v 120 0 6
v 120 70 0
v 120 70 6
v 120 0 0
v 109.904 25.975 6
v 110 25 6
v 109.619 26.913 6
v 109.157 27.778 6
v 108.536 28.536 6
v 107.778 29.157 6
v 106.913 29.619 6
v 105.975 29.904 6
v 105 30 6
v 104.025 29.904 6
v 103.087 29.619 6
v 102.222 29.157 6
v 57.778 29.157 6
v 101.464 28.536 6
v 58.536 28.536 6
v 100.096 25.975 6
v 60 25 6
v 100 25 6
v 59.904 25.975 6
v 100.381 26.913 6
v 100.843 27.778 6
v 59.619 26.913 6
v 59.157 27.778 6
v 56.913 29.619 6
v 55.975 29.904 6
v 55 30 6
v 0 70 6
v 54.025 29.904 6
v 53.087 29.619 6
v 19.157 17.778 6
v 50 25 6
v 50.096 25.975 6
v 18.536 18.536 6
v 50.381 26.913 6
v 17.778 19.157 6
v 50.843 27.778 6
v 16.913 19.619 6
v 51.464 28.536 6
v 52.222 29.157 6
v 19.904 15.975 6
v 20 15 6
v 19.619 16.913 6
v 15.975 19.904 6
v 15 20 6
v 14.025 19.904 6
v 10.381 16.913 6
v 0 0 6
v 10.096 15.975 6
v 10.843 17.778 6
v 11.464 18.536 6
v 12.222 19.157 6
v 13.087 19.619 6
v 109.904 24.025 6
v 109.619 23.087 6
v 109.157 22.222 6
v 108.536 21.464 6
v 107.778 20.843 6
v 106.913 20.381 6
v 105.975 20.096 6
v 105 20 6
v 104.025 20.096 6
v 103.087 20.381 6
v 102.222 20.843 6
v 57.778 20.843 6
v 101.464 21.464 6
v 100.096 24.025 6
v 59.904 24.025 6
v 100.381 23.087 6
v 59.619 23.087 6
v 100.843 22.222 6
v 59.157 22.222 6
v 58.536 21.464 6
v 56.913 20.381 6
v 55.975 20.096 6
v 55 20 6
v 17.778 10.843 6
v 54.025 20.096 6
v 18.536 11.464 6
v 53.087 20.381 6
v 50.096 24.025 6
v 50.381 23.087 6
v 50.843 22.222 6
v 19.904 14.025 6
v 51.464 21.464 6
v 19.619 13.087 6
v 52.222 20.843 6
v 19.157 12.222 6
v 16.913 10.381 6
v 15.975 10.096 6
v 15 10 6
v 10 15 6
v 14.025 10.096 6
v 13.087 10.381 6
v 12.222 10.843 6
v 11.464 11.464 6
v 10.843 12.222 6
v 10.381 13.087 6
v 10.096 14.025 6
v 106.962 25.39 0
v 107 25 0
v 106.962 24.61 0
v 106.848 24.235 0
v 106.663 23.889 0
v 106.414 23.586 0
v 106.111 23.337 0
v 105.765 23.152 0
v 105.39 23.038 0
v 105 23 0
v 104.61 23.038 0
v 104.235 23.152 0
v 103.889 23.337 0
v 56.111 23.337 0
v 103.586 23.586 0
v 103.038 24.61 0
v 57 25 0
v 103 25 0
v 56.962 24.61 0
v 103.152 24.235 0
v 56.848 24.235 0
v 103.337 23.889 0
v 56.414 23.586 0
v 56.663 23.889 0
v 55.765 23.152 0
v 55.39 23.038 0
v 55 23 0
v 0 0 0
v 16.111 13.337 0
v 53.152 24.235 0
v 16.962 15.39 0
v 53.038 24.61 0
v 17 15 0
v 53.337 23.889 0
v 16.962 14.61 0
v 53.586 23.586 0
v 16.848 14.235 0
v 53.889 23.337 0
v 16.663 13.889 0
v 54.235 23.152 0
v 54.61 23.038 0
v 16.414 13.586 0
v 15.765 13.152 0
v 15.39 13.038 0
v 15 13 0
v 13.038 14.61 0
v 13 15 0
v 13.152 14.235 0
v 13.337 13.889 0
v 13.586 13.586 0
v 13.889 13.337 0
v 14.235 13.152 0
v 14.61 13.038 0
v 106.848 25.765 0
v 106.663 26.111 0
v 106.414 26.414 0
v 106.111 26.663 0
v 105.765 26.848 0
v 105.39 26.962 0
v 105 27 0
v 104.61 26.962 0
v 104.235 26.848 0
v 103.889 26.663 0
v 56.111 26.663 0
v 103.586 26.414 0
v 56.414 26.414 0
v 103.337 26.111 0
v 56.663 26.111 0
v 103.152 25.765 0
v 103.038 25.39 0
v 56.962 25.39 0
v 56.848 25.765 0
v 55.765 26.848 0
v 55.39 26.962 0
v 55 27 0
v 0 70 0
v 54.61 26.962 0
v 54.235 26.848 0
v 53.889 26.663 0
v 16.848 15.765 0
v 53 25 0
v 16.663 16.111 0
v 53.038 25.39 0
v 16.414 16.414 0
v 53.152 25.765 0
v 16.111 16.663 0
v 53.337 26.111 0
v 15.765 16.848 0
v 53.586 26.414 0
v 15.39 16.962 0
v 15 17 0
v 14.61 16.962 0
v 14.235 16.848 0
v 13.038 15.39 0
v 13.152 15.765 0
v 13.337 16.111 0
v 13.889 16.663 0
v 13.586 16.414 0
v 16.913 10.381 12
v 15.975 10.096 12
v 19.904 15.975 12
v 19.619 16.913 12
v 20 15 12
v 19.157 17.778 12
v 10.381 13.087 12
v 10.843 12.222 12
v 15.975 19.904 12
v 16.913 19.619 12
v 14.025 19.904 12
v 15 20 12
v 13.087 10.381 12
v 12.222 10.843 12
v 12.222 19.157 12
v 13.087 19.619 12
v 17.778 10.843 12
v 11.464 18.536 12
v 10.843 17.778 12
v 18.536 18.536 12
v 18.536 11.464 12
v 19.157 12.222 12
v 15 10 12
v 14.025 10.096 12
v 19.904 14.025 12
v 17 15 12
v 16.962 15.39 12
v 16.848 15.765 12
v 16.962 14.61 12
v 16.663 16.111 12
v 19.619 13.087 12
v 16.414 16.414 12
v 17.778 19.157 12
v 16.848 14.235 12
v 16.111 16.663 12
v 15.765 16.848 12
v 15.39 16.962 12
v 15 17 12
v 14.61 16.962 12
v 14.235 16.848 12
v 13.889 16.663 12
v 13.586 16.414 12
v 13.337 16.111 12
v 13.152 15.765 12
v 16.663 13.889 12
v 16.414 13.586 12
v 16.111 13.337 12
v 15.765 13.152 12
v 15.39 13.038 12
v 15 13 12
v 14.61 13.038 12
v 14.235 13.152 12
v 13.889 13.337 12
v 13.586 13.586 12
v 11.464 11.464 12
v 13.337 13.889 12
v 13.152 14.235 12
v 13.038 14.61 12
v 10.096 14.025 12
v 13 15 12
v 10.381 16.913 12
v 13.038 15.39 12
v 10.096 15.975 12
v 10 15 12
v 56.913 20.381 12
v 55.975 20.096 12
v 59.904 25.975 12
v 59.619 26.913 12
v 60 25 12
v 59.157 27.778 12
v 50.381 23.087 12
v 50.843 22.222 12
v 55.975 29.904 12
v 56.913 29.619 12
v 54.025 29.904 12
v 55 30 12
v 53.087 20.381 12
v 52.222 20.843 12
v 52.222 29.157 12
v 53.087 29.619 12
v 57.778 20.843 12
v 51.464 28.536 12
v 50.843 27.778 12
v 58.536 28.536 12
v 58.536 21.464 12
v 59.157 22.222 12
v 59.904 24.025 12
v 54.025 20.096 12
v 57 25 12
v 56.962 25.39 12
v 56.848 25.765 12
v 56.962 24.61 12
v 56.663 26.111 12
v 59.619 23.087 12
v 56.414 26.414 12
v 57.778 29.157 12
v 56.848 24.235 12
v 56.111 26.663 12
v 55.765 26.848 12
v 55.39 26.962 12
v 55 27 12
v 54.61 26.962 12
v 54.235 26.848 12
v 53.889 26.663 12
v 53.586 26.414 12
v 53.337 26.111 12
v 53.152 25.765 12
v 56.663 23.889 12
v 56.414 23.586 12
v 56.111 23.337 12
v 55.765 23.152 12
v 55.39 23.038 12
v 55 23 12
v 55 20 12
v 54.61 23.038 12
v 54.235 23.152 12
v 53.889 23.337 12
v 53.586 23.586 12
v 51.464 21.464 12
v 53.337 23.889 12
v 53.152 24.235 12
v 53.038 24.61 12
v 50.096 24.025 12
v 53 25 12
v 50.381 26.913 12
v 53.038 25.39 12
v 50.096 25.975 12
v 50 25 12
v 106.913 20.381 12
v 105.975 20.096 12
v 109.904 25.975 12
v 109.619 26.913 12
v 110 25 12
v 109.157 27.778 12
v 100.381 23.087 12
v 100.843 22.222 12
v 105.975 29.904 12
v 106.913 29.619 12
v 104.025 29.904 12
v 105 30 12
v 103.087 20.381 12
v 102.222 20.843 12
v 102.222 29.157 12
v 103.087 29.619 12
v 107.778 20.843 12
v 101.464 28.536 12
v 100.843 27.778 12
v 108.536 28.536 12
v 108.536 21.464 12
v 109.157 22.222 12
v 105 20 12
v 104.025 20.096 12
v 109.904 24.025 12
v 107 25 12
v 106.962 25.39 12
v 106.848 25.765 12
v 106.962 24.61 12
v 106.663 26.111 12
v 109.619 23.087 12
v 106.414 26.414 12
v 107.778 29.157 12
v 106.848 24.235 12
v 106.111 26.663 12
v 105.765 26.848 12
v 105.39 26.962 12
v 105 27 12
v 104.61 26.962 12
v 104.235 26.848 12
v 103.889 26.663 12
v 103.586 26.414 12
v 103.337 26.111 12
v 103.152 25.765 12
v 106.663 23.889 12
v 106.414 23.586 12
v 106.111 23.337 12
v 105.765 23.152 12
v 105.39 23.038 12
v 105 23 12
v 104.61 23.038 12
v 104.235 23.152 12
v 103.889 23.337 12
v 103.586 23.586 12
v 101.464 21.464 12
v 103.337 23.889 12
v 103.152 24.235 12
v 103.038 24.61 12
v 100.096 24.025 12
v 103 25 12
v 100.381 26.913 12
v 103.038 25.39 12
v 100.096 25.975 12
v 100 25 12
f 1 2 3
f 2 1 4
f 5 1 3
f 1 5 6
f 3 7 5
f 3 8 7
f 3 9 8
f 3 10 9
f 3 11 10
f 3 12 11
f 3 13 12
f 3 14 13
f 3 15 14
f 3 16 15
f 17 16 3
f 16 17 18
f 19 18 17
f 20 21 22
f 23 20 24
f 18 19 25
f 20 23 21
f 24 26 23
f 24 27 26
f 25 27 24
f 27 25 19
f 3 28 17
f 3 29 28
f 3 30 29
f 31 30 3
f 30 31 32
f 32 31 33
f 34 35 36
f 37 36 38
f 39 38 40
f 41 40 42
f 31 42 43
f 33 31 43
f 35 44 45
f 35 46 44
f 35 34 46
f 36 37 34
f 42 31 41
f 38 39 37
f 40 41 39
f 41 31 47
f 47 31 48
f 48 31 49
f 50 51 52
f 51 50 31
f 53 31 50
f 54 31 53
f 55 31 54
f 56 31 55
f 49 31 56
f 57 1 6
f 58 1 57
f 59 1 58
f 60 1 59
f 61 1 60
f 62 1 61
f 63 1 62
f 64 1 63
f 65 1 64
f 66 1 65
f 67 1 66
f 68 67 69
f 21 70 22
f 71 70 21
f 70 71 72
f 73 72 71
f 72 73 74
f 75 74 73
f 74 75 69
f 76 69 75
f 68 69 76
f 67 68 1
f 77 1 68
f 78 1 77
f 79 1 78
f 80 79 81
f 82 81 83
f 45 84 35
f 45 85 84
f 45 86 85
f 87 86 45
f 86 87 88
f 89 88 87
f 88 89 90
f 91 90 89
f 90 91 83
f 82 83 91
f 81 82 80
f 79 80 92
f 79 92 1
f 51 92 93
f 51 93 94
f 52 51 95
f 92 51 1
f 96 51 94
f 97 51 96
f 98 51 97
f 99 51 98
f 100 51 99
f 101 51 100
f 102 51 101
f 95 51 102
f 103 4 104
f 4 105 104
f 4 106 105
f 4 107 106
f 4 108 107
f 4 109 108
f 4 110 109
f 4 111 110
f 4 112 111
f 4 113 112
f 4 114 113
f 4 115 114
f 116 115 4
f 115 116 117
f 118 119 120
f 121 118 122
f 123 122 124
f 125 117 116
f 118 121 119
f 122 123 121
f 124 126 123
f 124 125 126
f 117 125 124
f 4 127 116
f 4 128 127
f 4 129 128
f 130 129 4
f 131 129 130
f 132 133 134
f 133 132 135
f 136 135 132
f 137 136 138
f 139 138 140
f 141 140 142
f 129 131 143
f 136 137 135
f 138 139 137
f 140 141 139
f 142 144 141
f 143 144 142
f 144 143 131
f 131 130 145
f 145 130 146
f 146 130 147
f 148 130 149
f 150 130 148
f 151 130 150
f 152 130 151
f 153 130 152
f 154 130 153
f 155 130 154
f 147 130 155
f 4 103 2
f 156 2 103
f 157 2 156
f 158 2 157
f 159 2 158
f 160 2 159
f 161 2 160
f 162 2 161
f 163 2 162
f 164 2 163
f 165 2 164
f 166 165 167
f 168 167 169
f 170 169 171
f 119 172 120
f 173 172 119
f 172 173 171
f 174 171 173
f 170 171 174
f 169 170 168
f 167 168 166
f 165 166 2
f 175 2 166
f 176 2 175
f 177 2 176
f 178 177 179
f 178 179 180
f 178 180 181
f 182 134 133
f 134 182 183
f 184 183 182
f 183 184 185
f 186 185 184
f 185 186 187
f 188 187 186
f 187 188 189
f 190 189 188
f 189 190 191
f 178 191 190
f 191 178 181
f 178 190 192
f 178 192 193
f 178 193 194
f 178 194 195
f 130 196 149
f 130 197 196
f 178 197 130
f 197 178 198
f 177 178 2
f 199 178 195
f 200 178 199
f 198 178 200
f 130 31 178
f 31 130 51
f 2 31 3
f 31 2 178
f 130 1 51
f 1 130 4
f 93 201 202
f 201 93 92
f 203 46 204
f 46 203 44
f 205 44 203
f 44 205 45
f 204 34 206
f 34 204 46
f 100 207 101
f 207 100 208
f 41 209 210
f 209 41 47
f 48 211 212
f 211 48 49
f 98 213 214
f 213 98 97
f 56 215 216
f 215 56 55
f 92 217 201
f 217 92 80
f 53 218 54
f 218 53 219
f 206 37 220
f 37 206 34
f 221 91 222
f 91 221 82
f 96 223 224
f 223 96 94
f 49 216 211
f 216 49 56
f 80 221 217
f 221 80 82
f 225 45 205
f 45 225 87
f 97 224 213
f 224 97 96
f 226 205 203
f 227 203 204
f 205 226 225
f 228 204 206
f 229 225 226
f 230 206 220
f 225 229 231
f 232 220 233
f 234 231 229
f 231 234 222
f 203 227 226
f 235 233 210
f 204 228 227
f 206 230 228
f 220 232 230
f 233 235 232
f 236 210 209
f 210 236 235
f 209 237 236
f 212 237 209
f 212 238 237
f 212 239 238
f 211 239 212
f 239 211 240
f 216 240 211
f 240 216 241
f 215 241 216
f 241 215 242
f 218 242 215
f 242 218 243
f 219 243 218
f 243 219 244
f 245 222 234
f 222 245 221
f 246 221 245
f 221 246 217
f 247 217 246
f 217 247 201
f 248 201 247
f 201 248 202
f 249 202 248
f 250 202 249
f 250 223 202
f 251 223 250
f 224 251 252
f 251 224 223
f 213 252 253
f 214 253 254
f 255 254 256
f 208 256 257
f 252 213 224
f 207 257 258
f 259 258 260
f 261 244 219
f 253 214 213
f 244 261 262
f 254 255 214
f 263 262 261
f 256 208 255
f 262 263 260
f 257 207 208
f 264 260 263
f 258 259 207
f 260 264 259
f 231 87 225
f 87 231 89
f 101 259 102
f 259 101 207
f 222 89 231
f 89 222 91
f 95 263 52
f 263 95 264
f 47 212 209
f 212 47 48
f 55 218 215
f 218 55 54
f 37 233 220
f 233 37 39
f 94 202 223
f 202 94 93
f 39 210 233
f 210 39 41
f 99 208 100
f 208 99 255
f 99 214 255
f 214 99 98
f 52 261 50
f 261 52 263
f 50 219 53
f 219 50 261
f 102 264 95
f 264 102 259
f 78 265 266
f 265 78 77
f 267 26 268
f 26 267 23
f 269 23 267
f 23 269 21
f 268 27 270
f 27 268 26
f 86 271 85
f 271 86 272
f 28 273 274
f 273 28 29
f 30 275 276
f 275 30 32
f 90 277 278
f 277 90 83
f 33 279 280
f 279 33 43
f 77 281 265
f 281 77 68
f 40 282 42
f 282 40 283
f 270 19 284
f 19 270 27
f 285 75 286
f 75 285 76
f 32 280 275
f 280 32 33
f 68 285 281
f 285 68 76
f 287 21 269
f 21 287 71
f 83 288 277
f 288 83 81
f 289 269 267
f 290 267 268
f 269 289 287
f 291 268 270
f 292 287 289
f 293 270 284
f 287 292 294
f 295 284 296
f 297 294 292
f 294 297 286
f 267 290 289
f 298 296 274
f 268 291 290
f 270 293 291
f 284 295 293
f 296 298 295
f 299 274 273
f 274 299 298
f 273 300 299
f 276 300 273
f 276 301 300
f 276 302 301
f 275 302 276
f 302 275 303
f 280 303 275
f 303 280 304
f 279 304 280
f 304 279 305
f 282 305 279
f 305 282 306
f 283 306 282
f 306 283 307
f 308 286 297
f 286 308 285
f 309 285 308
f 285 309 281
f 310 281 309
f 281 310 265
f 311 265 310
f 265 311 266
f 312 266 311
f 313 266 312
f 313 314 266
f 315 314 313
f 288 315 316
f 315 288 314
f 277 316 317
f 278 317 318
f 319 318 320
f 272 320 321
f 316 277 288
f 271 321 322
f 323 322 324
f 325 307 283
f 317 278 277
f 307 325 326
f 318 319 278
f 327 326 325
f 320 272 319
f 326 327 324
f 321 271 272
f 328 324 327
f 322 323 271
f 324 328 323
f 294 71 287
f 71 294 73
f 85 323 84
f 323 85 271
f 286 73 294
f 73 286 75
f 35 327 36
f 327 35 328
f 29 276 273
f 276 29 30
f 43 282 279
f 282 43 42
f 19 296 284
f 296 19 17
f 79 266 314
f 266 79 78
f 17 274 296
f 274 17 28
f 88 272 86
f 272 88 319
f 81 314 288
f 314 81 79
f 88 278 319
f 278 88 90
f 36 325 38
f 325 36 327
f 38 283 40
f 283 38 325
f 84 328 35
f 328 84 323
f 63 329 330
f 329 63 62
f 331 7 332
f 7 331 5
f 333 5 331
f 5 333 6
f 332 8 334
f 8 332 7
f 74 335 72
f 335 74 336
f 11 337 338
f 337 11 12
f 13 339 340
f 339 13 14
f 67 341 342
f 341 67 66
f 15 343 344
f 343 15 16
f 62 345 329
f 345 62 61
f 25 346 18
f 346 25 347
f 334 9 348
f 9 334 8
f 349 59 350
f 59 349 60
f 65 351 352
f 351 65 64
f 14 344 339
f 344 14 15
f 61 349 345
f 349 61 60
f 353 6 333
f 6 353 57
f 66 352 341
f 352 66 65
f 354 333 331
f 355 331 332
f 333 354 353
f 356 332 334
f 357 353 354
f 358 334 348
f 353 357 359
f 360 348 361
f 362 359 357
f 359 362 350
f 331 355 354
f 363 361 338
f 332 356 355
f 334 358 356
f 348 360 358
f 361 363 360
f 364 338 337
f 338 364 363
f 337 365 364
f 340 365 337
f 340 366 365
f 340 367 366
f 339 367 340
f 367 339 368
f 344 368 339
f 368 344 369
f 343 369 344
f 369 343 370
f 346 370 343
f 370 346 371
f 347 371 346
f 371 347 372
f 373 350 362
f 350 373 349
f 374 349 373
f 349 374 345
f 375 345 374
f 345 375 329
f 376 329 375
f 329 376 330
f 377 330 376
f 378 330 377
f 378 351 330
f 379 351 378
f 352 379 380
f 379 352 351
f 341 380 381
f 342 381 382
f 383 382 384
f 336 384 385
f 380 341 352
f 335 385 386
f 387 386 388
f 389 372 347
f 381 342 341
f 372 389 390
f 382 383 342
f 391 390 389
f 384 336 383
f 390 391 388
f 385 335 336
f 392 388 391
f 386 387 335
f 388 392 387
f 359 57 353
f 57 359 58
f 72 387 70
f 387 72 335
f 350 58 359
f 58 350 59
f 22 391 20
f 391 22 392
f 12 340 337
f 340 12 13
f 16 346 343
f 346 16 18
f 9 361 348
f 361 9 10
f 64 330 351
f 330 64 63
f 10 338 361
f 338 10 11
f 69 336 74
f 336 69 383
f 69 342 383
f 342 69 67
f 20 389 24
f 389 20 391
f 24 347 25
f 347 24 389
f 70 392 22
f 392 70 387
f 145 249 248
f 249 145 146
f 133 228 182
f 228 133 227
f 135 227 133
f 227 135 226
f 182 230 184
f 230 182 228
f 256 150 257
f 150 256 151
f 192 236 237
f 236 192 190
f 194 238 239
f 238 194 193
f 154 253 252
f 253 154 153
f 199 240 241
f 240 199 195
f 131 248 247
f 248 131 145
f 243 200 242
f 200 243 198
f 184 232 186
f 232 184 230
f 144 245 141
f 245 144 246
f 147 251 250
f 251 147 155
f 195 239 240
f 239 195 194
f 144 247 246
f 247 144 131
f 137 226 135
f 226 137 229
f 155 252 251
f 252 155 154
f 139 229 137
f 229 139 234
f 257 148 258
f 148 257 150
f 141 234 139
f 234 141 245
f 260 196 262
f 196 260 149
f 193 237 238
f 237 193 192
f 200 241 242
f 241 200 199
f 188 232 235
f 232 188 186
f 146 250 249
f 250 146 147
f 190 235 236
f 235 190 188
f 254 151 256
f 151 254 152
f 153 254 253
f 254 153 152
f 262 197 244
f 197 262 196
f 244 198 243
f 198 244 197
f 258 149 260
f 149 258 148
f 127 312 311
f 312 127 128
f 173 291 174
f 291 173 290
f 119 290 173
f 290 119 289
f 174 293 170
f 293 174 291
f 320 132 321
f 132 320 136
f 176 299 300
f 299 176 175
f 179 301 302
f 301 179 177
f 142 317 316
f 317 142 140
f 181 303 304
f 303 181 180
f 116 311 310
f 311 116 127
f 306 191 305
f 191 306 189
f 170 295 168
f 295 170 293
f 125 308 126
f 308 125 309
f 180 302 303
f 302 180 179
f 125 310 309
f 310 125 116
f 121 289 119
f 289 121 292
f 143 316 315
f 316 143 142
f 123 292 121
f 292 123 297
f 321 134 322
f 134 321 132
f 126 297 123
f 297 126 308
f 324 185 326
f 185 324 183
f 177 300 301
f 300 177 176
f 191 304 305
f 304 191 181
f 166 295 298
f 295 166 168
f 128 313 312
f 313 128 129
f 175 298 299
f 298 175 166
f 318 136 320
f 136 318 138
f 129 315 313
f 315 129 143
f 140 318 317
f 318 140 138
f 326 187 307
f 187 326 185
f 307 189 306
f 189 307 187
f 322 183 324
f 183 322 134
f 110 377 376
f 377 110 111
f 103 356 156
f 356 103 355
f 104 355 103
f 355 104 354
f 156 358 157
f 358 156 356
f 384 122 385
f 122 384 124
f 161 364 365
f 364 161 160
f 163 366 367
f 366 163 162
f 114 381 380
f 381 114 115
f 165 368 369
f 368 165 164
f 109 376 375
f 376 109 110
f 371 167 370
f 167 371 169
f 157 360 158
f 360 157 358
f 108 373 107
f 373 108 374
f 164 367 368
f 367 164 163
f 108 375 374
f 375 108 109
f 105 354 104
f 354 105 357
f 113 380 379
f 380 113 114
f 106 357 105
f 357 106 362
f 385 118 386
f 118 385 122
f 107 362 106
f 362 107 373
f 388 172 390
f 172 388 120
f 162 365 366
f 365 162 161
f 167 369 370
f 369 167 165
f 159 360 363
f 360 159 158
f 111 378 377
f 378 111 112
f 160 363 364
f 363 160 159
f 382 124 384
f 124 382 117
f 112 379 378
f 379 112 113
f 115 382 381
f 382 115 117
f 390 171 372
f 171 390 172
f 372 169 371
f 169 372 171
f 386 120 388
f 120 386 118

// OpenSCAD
$fn = 32;

// ----------------------------------------------------------------------
// Boss field: plate with bosses at given coordinates
// ----------------------------------------------------------------------

// --- parameters (mm) ---
plate_l = 120;            // plate length, X
plate_w = 70;             // plate width, Y
plate_t = 6;              // plate thickness, Z
boss_d = 10;              // boss diameter
boss_h = 6;               // boss height above the plate
bore_d = 4;               // boss bore

total_h = plate_t + boss_h;  // overall height

difference() {
  union() {
    cube([plate_l, plate_w, plate_t]);
    translate([15, 15, plate_t]) cylinder(h = boss_h, d = boss_d);
    translate([55, 25, plate_t]) cylinder(h = boss_h, d = boss_d);
    translate([105, 25, plate_t]) cylinder(h = boss_h, d = boss_d);
  }
  translate([15, 15, -1]) cylinder(h = total_h + 2, d = bore_d);
  translate([55, 25, -1]) cylinder(h = total_h + 2, d = bore_d);
  translate([105, 25, -1]) cylinder(h = total_h + 2, d = bore_d);
}
